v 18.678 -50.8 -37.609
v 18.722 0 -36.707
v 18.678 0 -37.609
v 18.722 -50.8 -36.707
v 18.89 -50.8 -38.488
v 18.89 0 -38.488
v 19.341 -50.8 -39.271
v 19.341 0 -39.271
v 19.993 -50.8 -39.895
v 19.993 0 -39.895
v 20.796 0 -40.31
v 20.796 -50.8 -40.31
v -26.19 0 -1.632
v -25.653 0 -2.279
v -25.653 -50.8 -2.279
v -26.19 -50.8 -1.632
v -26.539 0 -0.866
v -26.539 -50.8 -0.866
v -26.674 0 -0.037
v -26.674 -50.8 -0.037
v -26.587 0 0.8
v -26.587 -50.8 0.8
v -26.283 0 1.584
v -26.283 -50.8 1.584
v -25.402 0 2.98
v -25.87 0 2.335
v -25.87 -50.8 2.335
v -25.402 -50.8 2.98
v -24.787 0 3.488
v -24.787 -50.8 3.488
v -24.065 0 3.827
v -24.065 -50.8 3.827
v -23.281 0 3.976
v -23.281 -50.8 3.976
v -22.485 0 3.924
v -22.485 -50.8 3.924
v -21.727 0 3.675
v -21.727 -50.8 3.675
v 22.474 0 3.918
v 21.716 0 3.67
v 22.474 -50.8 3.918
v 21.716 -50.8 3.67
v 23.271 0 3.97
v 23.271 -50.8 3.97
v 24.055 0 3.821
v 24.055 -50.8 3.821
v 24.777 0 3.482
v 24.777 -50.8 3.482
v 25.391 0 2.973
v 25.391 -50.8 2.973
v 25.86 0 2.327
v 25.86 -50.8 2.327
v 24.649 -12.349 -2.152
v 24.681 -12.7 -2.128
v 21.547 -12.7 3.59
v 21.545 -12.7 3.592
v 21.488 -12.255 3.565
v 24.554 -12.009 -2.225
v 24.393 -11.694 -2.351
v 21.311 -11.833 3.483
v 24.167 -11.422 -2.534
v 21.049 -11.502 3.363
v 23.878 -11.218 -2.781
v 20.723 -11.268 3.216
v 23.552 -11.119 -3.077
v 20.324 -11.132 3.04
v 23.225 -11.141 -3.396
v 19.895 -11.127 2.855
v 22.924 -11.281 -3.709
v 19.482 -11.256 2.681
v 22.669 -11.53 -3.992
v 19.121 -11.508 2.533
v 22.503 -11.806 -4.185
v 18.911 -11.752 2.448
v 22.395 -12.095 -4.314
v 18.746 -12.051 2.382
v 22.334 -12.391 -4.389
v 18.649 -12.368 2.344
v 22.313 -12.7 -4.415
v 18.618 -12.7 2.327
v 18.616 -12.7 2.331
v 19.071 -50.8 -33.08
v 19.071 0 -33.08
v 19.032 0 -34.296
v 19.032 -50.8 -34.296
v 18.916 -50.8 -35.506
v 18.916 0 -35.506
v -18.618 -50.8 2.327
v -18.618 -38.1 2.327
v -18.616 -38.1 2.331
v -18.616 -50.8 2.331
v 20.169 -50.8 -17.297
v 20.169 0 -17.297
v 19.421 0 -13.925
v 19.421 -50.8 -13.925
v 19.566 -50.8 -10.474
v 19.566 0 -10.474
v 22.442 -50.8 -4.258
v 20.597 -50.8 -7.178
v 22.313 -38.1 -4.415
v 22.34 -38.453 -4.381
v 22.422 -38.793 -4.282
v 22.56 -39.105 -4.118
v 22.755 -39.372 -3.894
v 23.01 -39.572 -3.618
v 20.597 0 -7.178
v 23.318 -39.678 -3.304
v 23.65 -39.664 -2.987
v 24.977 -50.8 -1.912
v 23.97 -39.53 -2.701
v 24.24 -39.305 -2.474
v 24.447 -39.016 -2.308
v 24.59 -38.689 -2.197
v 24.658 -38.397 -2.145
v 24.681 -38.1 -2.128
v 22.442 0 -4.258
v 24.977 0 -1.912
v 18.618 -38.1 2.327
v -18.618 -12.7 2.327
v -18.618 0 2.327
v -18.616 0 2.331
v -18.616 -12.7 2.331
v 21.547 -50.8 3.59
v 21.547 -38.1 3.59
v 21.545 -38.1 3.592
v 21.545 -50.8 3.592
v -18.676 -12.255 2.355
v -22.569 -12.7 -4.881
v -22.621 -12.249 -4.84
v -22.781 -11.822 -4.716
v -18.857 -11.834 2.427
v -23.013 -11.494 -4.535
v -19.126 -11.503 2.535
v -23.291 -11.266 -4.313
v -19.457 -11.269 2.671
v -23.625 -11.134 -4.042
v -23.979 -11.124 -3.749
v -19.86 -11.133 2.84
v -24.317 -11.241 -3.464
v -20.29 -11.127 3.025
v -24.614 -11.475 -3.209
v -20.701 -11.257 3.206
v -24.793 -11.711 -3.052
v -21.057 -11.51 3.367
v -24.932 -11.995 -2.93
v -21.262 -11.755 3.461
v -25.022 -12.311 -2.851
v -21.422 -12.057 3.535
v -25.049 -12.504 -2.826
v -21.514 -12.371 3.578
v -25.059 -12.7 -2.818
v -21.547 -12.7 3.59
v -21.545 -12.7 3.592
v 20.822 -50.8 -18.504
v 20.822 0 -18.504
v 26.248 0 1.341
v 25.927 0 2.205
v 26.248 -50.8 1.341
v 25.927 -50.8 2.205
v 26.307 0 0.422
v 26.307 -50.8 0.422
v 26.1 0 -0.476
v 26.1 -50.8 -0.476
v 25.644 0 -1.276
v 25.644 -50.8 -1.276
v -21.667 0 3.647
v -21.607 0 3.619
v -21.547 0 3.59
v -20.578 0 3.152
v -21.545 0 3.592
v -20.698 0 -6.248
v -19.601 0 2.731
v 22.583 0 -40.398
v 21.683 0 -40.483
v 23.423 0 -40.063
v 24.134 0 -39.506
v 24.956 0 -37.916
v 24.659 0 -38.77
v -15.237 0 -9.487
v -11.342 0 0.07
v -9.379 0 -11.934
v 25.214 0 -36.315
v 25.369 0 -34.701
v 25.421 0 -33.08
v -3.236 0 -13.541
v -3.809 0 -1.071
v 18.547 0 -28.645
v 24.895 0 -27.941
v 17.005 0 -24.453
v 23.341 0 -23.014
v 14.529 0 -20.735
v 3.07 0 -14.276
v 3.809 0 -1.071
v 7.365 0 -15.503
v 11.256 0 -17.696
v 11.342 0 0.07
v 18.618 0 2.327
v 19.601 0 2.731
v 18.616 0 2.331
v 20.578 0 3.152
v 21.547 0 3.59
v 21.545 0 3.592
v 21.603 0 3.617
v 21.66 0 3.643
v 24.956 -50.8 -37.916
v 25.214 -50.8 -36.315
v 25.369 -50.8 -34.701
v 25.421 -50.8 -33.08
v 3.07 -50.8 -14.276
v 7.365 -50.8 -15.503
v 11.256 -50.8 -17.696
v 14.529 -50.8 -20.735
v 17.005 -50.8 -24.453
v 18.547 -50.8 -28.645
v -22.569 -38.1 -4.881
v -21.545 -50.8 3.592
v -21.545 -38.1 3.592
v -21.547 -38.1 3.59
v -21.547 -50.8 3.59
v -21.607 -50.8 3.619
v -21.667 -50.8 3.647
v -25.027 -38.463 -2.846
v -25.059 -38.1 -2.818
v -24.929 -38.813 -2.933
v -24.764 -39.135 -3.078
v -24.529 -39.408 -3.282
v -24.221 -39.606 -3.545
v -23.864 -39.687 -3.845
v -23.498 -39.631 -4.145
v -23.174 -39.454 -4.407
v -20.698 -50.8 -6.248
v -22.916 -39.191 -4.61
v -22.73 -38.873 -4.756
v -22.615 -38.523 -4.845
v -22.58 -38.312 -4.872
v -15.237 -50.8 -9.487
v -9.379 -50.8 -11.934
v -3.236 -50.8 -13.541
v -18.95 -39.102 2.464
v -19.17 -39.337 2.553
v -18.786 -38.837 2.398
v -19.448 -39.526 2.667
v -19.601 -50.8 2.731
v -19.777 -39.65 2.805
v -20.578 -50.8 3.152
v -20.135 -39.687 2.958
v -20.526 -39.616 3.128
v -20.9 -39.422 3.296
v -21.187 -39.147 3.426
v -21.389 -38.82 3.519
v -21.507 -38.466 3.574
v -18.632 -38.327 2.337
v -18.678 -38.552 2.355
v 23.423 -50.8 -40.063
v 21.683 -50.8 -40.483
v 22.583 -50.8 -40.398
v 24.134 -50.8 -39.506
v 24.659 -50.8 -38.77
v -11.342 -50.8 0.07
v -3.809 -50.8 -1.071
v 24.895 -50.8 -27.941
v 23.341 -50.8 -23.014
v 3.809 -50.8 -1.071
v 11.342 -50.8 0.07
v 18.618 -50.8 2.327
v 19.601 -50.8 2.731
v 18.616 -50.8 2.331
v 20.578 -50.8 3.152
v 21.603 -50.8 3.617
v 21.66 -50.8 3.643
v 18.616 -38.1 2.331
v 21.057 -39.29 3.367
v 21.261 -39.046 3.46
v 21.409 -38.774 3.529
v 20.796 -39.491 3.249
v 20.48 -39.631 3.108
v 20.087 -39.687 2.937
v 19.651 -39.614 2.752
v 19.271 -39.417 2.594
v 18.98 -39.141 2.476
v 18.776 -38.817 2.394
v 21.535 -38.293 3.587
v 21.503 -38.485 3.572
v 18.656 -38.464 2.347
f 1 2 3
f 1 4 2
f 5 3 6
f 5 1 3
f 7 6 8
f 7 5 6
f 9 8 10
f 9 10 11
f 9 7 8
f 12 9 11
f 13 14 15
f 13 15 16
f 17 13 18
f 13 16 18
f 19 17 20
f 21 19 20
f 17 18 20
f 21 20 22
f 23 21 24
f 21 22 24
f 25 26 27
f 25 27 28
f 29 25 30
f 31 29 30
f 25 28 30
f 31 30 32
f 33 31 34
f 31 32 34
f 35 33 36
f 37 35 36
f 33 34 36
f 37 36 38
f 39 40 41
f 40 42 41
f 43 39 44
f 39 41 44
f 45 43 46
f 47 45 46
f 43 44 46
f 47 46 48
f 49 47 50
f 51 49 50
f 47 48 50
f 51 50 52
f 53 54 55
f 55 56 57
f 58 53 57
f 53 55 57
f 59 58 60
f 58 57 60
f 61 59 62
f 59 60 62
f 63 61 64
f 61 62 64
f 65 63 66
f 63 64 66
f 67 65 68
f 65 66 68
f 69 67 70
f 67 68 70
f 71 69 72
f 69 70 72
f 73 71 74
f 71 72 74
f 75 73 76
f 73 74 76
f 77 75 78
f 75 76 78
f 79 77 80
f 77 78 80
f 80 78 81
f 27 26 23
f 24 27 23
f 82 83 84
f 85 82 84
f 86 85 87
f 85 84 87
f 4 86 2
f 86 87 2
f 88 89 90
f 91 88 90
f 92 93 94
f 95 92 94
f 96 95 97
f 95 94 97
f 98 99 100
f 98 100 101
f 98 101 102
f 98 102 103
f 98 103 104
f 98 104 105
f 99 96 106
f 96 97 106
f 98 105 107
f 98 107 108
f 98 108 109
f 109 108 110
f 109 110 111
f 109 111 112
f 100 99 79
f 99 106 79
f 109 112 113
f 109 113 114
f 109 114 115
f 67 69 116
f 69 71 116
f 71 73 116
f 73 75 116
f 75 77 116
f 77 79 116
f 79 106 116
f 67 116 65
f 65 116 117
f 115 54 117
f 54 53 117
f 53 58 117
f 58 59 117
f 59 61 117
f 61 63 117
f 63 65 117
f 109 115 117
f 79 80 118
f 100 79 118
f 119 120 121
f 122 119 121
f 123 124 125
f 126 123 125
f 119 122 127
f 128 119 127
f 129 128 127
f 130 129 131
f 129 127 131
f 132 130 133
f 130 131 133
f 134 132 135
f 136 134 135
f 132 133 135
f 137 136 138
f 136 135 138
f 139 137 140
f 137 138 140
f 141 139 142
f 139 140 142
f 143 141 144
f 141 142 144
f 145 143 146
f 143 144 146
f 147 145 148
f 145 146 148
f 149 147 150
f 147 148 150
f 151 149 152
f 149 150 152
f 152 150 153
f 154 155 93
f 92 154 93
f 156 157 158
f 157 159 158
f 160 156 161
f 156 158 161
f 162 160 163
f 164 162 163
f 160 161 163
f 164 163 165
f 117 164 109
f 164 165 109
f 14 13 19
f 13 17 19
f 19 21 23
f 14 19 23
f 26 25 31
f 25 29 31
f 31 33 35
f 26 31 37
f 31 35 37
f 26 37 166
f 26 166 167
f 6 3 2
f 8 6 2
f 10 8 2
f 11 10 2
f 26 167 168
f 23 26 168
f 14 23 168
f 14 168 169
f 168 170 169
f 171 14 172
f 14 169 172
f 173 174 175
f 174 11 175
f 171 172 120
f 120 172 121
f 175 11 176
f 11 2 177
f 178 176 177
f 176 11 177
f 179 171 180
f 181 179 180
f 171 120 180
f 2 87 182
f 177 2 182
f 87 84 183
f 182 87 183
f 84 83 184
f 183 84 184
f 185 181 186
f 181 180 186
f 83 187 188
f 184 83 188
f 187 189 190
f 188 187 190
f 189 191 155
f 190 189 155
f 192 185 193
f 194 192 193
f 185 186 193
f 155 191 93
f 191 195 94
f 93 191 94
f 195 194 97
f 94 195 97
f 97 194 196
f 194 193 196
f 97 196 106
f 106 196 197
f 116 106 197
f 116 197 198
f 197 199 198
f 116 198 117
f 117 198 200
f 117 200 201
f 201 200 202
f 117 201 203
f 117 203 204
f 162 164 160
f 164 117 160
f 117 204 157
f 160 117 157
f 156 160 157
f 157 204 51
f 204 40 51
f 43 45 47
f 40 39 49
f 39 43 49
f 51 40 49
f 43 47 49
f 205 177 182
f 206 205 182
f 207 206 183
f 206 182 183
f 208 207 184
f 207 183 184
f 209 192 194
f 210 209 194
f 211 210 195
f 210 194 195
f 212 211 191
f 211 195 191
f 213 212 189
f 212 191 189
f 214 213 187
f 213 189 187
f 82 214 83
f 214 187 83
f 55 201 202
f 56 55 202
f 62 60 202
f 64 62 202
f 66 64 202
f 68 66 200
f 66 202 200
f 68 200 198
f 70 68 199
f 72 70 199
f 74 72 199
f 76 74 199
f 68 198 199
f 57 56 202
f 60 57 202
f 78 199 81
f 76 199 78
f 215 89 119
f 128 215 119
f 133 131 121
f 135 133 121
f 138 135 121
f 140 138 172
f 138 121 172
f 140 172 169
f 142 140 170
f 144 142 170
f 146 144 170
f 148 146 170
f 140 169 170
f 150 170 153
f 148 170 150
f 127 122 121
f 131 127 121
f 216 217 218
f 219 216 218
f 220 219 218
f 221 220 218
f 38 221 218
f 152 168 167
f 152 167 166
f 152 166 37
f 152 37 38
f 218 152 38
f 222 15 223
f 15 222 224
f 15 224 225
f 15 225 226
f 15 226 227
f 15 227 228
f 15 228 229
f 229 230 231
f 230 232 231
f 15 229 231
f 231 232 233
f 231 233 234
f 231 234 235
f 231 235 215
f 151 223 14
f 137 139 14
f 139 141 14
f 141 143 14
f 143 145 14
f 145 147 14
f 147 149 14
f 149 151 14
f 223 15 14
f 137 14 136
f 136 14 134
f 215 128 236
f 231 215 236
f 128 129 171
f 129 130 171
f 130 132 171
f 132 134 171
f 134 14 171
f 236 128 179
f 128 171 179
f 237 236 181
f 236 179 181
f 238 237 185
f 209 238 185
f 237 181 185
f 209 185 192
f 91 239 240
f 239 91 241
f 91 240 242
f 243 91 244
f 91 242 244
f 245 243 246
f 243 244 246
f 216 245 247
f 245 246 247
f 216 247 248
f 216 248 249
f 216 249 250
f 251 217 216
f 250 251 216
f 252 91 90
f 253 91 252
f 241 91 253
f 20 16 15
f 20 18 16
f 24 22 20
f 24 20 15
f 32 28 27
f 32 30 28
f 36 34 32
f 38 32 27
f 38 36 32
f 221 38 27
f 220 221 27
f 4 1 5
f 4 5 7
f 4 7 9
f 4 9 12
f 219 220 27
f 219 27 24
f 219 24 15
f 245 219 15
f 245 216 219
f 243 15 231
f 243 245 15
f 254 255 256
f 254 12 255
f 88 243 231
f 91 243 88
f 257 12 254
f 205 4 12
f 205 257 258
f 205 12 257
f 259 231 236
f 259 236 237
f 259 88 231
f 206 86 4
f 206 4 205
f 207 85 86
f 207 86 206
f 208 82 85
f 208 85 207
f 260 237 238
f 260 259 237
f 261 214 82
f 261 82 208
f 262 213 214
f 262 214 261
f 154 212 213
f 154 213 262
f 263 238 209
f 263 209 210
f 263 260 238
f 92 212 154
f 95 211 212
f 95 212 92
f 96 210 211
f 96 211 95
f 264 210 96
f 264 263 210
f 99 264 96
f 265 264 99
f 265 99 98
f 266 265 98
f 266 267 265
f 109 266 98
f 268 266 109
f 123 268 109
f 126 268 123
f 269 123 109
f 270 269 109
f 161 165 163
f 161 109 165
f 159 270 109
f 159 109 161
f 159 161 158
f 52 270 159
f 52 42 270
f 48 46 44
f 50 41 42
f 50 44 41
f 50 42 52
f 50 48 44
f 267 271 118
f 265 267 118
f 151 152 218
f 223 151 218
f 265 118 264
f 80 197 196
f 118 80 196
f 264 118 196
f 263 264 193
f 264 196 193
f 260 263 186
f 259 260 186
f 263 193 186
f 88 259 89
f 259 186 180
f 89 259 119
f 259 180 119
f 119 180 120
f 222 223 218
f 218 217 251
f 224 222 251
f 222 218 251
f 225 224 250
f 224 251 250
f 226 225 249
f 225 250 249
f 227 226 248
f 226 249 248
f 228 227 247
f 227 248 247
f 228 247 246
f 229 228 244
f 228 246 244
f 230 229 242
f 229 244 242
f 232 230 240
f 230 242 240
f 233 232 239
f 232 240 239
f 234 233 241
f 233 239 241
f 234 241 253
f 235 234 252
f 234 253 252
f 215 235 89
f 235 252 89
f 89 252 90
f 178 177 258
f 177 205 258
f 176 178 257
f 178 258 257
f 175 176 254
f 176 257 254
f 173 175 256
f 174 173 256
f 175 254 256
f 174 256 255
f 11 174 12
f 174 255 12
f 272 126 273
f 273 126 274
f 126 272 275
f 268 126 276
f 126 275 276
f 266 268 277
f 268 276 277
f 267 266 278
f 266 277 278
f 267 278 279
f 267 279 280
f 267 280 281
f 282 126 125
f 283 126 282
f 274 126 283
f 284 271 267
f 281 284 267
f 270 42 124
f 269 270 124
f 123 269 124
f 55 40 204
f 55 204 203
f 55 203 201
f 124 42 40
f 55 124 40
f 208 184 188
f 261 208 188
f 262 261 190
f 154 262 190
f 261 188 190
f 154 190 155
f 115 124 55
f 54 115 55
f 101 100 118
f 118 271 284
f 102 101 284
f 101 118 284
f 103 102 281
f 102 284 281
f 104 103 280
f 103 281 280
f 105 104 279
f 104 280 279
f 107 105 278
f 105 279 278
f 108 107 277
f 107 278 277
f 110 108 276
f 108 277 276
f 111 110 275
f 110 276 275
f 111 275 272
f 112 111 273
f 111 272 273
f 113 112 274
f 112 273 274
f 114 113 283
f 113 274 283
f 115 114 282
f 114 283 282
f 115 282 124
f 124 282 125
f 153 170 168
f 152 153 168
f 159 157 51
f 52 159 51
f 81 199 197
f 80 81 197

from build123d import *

# Parameters (mm, degrees)
F1_DEPTH = 50.8
F2_R     = 3.17499
F4_DEPTH = 25.4
F6_DEPTH = 25.4
F7_R     = 50.8
F8_DEPTH = 50.8
F9_R     = 3.175


# Not quite as in the source:
# - a fillet or chamfer is up to 0.001 mm smaller than in the source, because OpenCascade refuses the exact size
# - a feature names something its author has since deleted; it is built from what else it names


with BuildPart() as f1:
    # F0 (on Front) → F1 (new body)
    with BuildSketch(Plane.XZ):
        with BuildLine():
            ThreePointArc((24.0096036311, -41.4286058918), (25.0654524906, -37.313693309), (25.4207147422, -33.0803599757))
            ThreePointArc((25.4207147422, -33.0803599757), (24.2437436495, -25.4380520418), (20.821906037, -18.5039941488))
            Line((20.821906037, -18.5039941488), (20.1693195051, -17.2969153494))
            ThreePointArc((20.1693195051, -17.2969153494), (20.4643815884, -7.4727541905), (27.4307736322, -0.5394587257))
            Line((27.4307736322, -0.5394587257), (24.3787300207, 5.0289817915))
            ThreePointArc((24.3787300207, 5.0289817915), (22.9739817859, 4.2874085483), (21.5467011146, 3.5901866586))
            ThreePointArc((21.5467011146, 3.5901866586), (20.0925256969, 2.935513576), (18.6184879198, 2.3268793492))
            ThreePointArc((18.6184879198, 2.3268793492), (0, -1.2138607271), (-18.6184879198, 2.3268793492))
            ThreePointArc((-18.6184879198, 2.3268793492), (-20.0925256969, 2.935513576), (-21.5467011146, 3.5901866586))
            ThreePointArc((-21.5467011146, 3.5901866586), (-22.97860176, 4.289755995), (-24.3878181692, 5.0339641827))
            Line((-24.3878181692, 5.0339641827), (-27.4450352449, -0.5316376492))
            ThreePointArc((-27.4450352449, -0.5316376492), (-13.4987465328, -10.3152085141), (3.0701766945, -14.276017876))
            ThreePointArc((3.0701766945, -14.276017876), (14.5292424103, -20.7351129184), (19.0707147422, -33.0803599757))
            ThreePointArc((19.0707147422, -33.0803599757), (18.8042680535, -36.2553599757), (18.0123814088, -39.3415444128))
            Line((18.0123814088, -39.3415444128), (24.0096036311, -41.4286058918))
        make_face()
        with BuildLine():
            ThreePointArc((18.6184879198, 2.3268793492), (20.0925256969, 2.935513576), (21.5467011146, 3.5901866586))
            Line((21.5467011146, 3.5901866586), (19.869957668, 6.6493979065))
            Line((19.869957668, 6.6493979065), (17.0857374094, 5.1233761008))
            Line((17.0857374094, 5.1233761008), (18.6184879198, 2.3268793492))
        make_face()
        with BuildLine():
            ThreePointArc((-21.5467011146, 3.5901866586), (-20.0925256969, 2.935513576), (-18.6184879198, 2.3268793492))
            Line((-18.6184879198, 2.3268793492), (-17.0857374094, 5.1233761008))
            Line((-17.0857374094, 5.1233761008), (-19.869957668, 6.6493979065))
            Line((-19.869957668, 6.6493979065), (-21.5467011146, 3.5901866586))
        make_face()
    extrude(amount=F1_DEPTH)

    # F2 (radius 3.175 in the source; OpenCascade refuses exactly that, so slightly less here)
    f2_edges = [f1.edges().sort_by_distance(p)[0] for p in [
        (24.009604, -25.4, -41.428606),
        (18.012381, -25.4, -39.341544),
    ]]
    fillet(f2_edges, radius=F2_R)

    # F3 (on face) → F4 (cut)
    with BuildSketch(Plane(origin=(1.7876055886, 0, -3.2614787517), x_dir=(0.8769197665, 0, 0.4806367892), z_dir=(-0.4806367892, 0, 0.8769197665))):
        with BuildLine():
            Line((20.6203038983, -38.1), (20.6203038983, -12.7))
            ThreePointArc((20.6203038983, -12.7), (19.0328038983, -11.1125), (17.4453038983, -12.7))
            Line((17.4453038983, -12.7), (17.4453038983, -38.1))
            ThreePointArc((17.4453038983, -38.1), (19.0328038983, -39.6875), (20.6203038983, -38.1))
        make_face()
    extrude(amount=-F4_DEPTH, mode=Mode.SUBTRACT)

    # F5 (on face) → F6 (cut)
    with BuildSketch(Plane(origin=(-1.7876055886, 0, -3.2614787517), x_dir=(0.8769197665, 0, -0.4806367892), z_dir=(0.4806367892, 0, 0.8769197665))):
        with BuildLine():
            ThreePointArc((-20.6203038983, -38.1), (-19.0328038983, -39.6875), (-17.4453038983, -38.1))
            Line((-17.4453038983, -38.1), (-17.4453038983, -12.7))
            ThreePointArc((-17.4453038983, -12.7), (-19.0328038983, -11.1125), (-20.6203038983, -12.7))
            Line((-20.6203038983, -12.7), (-20.6203038983, -38.1))
        make_face()
    extrude(amount=-F6_DEPTH, mode=Mode.SUBTRACT)

    # F7 (on face) → F8 (cut)
    with BuildSketch(Plane(origin=(0, 0, 0), x_dir=(-1, 0, 0), z_dir=(0, 1, 0))):
        with Locations((-9.1173e-06, 49.5971090476)):
            Circle(F7_R)
    extrude(amount=-F8_DEPTH, mode=Mode.SUBTRACT)

    # F9
    f9_edges = [f1.edges().sort_by_distance(p)[0] for p in [
        (24.37873, -25.4, 5.028982),
        (27.430774, -25.4, -0.539459),
        (-24.387818, -25.4, 5.033964),
        (-27.445035, -25.4, -0.531638),
    ]]
    fillet(f9_edges, radius=F9_R)


solid = f1.part
